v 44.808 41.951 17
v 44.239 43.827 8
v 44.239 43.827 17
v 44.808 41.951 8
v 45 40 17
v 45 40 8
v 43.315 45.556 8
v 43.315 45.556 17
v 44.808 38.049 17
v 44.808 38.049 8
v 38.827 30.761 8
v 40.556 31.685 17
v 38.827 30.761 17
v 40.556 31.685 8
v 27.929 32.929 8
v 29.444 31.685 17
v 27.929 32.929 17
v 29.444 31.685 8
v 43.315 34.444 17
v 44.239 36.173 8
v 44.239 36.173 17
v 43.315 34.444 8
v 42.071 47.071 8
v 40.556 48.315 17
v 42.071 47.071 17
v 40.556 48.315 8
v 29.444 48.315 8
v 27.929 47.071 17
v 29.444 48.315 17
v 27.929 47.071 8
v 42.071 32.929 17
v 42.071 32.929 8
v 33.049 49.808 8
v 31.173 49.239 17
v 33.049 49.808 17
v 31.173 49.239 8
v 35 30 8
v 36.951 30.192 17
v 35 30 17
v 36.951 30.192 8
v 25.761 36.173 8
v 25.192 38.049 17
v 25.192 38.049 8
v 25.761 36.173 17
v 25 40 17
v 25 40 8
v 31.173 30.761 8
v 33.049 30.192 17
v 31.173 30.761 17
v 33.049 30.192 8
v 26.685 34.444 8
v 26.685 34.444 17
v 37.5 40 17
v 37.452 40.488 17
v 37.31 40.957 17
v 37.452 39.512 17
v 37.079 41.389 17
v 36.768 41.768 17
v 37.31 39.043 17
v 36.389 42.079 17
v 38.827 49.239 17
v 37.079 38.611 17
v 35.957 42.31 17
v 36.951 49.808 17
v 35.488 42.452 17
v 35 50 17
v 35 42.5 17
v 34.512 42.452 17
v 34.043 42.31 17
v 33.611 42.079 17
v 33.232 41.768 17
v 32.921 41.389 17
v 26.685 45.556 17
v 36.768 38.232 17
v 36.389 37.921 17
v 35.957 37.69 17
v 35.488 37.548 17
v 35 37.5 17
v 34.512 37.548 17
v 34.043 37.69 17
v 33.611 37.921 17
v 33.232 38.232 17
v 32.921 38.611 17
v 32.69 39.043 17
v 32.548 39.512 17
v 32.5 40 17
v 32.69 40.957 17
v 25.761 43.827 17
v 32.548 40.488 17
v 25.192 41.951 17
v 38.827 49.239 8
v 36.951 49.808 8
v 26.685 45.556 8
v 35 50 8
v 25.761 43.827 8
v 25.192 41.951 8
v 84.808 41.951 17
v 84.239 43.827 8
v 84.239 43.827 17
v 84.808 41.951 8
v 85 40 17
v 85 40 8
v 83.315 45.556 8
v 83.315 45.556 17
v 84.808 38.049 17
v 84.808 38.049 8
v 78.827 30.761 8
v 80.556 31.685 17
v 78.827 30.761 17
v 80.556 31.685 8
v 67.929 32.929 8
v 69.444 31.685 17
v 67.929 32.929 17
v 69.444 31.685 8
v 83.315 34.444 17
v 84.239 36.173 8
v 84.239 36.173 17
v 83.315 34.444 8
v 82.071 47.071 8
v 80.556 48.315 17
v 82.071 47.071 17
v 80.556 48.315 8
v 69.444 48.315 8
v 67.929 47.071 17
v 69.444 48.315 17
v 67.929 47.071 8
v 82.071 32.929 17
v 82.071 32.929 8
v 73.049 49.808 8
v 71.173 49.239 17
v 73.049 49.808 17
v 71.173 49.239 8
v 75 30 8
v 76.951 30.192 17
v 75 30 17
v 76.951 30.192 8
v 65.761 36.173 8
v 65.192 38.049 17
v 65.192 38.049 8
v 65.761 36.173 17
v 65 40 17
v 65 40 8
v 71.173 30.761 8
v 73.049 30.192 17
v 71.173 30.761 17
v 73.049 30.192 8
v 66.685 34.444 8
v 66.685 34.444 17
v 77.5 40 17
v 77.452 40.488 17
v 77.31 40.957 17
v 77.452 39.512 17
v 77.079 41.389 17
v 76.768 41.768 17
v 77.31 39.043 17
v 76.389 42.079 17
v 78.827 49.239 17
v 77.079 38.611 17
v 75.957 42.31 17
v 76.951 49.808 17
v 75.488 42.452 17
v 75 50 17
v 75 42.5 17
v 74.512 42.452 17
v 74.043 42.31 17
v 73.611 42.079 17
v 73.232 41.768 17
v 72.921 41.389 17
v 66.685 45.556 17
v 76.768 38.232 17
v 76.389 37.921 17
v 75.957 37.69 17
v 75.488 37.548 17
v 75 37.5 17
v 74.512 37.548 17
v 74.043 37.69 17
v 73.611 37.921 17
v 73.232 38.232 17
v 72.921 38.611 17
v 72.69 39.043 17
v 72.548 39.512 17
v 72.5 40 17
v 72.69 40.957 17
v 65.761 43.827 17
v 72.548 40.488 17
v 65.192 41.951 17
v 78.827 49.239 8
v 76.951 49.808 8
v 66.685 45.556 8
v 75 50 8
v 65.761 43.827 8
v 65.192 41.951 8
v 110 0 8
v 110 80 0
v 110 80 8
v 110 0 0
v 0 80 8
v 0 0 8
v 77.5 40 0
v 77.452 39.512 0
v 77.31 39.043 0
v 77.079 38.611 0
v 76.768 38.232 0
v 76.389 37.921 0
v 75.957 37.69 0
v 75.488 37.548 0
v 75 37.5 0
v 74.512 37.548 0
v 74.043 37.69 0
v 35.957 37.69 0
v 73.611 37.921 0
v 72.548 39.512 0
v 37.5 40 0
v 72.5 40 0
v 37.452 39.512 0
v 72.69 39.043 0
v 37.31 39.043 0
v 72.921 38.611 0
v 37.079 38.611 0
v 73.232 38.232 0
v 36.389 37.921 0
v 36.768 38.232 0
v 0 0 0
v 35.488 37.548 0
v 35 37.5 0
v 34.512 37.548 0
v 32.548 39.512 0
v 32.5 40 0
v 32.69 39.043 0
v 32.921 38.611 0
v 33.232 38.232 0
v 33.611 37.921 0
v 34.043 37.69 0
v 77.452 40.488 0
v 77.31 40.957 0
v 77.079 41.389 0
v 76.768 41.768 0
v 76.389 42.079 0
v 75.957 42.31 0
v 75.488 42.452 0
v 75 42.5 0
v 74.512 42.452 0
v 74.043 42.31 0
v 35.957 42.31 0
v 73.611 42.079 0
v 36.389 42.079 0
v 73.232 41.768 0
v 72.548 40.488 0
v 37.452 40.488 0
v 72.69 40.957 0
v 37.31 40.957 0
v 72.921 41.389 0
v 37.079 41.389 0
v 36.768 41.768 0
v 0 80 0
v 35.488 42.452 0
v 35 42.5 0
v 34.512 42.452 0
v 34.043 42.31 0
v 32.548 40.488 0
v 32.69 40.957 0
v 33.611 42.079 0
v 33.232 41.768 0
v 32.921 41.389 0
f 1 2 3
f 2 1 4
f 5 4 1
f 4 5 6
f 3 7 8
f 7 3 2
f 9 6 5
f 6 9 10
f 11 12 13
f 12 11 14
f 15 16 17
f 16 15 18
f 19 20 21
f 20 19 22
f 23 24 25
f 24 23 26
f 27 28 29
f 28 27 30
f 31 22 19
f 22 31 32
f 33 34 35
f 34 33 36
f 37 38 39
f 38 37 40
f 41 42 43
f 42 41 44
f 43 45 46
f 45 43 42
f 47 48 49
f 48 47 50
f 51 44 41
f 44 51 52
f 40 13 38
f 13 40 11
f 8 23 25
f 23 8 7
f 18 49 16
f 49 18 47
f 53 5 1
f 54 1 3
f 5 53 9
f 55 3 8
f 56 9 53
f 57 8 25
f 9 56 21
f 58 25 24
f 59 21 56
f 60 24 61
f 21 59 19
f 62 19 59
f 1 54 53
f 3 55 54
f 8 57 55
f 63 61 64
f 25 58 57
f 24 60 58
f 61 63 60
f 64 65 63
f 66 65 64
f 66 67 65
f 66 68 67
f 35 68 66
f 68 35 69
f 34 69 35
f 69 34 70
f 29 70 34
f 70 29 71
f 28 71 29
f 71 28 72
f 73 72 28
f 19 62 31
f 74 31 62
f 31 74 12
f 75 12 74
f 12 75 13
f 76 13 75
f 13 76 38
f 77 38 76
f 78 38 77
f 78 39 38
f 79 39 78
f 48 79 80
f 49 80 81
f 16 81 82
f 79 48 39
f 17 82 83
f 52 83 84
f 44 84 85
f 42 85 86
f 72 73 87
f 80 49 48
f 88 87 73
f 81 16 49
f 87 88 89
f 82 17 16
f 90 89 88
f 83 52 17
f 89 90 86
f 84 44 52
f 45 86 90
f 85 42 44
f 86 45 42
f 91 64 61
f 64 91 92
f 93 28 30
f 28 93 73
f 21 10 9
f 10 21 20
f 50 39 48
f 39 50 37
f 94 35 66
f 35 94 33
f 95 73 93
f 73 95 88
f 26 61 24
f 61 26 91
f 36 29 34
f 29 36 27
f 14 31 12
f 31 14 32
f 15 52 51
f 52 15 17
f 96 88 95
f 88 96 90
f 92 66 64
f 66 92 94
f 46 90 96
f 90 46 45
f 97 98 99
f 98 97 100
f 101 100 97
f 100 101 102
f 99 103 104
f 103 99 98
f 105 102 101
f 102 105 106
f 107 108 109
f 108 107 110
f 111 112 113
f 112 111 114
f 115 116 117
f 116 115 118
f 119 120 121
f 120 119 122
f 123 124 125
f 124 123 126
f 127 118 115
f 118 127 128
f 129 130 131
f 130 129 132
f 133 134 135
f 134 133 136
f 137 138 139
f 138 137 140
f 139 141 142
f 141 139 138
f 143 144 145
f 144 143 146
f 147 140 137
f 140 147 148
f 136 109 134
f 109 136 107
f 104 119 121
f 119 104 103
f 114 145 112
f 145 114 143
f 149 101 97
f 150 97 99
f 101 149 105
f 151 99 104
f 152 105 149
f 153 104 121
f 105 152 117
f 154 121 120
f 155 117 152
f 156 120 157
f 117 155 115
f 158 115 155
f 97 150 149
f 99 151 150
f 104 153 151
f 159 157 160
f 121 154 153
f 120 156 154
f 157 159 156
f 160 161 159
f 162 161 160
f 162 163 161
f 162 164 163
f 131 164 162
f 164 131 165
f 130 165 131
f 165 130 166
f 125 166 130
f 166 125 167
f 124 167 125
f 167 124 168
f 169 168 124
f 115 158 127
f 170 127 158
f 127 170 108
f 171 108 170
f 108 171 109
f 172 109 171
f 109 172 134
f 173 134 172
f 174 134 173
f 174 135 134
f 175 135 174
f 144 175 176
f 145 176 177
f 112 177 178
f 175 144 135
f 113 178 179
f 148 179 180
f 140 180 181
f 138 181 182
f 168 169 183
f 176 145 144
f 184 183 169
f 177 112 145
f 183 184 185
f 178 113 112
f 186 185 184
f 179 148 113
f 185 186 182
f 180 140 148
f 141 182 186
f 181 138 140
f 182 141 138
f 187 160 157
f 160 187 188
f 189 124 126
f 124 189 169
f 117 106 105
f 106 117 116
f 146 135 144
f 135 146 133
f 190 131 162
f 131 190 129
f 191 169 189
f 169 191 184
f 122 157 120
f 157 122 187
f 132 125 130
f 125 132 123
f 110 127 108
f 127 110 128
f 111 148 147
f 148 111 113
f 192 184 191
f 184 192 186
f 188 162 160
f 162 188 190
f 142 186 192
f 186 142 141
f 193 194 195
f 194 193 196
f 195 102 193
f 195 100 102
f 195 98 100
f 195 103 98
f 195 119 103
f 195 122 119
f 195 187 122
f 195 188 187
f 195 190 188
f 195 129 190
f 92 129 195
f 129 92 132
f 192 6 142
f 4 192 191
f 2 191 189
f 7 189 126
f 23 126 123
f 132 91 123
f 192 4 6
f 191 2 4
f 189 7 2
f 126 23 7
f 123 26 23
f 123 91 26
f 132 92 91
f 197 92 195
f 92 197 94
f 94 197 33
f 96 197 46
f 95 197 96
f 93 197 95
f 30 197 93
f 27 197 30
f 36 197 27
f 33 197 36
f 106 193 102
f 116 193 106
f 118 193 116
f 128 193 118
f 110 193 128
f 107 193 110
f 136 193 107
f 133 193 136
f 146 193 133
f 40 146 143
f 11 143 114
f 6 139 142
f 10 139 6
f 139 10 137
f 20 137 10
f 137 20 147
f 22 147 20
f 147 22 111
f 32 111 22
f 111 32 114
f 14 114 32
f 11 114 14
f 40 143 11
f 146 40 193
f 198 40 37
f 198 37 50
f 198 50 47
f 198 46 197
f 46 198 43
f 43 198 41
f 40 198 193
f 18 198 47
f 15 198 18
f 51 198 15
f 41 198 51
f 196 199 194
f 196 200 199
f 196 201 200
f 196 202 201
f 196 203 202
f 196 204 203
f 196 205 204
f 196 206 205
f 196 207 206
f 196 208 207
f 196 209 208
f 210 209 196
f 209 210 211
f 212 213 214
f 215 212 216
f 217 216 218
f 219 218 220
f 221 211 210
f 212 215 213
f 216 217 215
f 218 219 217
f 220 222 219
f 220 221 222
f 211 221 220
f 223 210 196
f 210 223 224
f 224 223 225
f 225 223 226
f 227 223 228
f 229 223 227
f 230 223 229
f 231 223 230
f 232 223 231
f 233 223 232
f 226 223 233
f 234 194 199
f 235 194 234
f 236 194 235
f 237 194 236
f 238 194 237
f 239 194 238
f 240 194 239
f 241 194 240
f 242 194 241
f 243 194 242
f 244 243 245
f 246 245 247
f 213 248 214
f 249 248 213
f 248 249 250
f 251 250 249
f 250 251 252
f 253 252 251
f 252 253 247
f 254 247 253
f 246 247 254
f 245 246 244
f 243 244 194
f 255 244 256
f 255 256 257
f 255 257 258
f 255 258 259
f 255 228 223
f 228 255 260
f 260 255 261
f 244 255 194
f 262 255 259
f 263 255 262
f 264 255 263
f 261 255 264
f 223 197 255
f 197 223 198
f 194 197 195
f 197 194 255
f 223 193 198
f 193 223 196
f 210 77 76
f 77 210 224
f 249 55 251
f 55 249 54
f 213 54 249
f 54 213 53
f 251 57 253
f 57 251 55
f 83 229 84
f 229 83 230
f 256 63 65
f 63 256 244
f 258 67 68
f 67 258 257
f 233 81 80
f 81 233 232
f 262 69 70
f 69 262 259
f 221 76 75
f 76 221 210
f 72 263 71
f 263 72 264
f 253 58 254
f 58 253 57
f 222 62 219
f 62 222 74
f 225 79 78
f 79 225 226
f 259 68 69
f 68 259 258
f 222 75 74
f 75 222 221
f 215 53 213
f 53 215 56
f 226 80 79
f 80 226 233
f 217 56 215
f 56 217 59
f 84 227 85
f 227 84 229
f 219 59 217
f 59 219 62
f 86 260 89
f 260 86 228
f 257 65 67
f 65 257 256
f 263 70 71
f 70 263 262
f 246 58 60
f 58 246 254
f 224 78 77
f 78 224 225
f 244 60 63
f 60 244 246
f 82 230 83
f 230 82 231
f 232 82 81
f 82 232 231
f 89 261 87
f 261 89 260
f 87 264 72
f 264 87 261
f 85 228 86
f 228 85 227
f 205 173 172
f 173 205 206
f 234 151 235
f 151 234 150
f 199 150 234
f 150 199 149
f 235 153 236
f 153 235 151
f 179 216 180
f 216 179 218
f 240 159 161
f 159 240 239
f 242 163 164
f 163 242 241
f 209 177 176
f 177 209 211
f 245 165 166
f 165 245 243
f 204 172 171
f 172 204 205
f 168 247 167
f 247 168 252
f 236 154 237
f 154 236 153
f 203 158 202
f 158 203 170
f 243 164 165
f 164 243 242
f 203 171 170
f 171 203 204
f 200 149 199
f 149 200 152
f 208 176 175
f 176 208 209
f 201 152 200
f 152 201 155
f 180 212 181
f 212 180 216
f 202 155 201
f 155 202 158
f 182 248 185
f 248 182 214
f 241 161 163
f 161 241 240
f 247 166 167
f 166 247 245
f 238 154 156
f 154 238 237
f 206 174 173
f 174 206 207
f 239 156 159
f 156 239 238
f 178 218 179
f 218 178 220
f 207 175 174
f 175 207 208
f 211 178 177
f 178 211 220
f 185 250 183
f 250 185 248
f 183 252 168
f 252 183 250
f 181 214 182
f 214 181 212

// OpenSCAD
$fn = 32;

// ----------------------------------------------------------------------
// Drill jig: two_boss jig
// ----------------------------------------------------------------------

// --- parameters (mm) ---
plate_l = 110;            // plate length, X
plate_w = 80;             // plate width, Y
plate_t = 8;              // plate thickness
boss_d = 20;              // guide boss diameter
boss_h = 10;              // boss height above the plate
guide_d = 5;              // guide hole diameter
boss_pitch = 40;          // boss pitch

n_boss = 2;  // guide bosses
boss_x0 = (plate_l - (n_boss - 1) * boss_pitch) / 2;  // first boss X
boss_top = plate_t - 1 + boss_h;  // boss crown height
total_h = boss_top;  // overall height

difference() {
  union() {
  cube([plate_l, plate_w, plate_t]);
  for (i = [0 : n_boss - 1])
    translate([boss_x0 + i * boss_pitch, plate_w / 2, plate_t - 1])
      cylinder(h = boss_h, d = boss_d);
  }
  for (i = [0 : n_boss - 1])
    translate([boss_x0 + i * boss_pitch, plate_w / 2, -1])
      cylinder(h = plate_t + boss_h, d = guide_d);
}
